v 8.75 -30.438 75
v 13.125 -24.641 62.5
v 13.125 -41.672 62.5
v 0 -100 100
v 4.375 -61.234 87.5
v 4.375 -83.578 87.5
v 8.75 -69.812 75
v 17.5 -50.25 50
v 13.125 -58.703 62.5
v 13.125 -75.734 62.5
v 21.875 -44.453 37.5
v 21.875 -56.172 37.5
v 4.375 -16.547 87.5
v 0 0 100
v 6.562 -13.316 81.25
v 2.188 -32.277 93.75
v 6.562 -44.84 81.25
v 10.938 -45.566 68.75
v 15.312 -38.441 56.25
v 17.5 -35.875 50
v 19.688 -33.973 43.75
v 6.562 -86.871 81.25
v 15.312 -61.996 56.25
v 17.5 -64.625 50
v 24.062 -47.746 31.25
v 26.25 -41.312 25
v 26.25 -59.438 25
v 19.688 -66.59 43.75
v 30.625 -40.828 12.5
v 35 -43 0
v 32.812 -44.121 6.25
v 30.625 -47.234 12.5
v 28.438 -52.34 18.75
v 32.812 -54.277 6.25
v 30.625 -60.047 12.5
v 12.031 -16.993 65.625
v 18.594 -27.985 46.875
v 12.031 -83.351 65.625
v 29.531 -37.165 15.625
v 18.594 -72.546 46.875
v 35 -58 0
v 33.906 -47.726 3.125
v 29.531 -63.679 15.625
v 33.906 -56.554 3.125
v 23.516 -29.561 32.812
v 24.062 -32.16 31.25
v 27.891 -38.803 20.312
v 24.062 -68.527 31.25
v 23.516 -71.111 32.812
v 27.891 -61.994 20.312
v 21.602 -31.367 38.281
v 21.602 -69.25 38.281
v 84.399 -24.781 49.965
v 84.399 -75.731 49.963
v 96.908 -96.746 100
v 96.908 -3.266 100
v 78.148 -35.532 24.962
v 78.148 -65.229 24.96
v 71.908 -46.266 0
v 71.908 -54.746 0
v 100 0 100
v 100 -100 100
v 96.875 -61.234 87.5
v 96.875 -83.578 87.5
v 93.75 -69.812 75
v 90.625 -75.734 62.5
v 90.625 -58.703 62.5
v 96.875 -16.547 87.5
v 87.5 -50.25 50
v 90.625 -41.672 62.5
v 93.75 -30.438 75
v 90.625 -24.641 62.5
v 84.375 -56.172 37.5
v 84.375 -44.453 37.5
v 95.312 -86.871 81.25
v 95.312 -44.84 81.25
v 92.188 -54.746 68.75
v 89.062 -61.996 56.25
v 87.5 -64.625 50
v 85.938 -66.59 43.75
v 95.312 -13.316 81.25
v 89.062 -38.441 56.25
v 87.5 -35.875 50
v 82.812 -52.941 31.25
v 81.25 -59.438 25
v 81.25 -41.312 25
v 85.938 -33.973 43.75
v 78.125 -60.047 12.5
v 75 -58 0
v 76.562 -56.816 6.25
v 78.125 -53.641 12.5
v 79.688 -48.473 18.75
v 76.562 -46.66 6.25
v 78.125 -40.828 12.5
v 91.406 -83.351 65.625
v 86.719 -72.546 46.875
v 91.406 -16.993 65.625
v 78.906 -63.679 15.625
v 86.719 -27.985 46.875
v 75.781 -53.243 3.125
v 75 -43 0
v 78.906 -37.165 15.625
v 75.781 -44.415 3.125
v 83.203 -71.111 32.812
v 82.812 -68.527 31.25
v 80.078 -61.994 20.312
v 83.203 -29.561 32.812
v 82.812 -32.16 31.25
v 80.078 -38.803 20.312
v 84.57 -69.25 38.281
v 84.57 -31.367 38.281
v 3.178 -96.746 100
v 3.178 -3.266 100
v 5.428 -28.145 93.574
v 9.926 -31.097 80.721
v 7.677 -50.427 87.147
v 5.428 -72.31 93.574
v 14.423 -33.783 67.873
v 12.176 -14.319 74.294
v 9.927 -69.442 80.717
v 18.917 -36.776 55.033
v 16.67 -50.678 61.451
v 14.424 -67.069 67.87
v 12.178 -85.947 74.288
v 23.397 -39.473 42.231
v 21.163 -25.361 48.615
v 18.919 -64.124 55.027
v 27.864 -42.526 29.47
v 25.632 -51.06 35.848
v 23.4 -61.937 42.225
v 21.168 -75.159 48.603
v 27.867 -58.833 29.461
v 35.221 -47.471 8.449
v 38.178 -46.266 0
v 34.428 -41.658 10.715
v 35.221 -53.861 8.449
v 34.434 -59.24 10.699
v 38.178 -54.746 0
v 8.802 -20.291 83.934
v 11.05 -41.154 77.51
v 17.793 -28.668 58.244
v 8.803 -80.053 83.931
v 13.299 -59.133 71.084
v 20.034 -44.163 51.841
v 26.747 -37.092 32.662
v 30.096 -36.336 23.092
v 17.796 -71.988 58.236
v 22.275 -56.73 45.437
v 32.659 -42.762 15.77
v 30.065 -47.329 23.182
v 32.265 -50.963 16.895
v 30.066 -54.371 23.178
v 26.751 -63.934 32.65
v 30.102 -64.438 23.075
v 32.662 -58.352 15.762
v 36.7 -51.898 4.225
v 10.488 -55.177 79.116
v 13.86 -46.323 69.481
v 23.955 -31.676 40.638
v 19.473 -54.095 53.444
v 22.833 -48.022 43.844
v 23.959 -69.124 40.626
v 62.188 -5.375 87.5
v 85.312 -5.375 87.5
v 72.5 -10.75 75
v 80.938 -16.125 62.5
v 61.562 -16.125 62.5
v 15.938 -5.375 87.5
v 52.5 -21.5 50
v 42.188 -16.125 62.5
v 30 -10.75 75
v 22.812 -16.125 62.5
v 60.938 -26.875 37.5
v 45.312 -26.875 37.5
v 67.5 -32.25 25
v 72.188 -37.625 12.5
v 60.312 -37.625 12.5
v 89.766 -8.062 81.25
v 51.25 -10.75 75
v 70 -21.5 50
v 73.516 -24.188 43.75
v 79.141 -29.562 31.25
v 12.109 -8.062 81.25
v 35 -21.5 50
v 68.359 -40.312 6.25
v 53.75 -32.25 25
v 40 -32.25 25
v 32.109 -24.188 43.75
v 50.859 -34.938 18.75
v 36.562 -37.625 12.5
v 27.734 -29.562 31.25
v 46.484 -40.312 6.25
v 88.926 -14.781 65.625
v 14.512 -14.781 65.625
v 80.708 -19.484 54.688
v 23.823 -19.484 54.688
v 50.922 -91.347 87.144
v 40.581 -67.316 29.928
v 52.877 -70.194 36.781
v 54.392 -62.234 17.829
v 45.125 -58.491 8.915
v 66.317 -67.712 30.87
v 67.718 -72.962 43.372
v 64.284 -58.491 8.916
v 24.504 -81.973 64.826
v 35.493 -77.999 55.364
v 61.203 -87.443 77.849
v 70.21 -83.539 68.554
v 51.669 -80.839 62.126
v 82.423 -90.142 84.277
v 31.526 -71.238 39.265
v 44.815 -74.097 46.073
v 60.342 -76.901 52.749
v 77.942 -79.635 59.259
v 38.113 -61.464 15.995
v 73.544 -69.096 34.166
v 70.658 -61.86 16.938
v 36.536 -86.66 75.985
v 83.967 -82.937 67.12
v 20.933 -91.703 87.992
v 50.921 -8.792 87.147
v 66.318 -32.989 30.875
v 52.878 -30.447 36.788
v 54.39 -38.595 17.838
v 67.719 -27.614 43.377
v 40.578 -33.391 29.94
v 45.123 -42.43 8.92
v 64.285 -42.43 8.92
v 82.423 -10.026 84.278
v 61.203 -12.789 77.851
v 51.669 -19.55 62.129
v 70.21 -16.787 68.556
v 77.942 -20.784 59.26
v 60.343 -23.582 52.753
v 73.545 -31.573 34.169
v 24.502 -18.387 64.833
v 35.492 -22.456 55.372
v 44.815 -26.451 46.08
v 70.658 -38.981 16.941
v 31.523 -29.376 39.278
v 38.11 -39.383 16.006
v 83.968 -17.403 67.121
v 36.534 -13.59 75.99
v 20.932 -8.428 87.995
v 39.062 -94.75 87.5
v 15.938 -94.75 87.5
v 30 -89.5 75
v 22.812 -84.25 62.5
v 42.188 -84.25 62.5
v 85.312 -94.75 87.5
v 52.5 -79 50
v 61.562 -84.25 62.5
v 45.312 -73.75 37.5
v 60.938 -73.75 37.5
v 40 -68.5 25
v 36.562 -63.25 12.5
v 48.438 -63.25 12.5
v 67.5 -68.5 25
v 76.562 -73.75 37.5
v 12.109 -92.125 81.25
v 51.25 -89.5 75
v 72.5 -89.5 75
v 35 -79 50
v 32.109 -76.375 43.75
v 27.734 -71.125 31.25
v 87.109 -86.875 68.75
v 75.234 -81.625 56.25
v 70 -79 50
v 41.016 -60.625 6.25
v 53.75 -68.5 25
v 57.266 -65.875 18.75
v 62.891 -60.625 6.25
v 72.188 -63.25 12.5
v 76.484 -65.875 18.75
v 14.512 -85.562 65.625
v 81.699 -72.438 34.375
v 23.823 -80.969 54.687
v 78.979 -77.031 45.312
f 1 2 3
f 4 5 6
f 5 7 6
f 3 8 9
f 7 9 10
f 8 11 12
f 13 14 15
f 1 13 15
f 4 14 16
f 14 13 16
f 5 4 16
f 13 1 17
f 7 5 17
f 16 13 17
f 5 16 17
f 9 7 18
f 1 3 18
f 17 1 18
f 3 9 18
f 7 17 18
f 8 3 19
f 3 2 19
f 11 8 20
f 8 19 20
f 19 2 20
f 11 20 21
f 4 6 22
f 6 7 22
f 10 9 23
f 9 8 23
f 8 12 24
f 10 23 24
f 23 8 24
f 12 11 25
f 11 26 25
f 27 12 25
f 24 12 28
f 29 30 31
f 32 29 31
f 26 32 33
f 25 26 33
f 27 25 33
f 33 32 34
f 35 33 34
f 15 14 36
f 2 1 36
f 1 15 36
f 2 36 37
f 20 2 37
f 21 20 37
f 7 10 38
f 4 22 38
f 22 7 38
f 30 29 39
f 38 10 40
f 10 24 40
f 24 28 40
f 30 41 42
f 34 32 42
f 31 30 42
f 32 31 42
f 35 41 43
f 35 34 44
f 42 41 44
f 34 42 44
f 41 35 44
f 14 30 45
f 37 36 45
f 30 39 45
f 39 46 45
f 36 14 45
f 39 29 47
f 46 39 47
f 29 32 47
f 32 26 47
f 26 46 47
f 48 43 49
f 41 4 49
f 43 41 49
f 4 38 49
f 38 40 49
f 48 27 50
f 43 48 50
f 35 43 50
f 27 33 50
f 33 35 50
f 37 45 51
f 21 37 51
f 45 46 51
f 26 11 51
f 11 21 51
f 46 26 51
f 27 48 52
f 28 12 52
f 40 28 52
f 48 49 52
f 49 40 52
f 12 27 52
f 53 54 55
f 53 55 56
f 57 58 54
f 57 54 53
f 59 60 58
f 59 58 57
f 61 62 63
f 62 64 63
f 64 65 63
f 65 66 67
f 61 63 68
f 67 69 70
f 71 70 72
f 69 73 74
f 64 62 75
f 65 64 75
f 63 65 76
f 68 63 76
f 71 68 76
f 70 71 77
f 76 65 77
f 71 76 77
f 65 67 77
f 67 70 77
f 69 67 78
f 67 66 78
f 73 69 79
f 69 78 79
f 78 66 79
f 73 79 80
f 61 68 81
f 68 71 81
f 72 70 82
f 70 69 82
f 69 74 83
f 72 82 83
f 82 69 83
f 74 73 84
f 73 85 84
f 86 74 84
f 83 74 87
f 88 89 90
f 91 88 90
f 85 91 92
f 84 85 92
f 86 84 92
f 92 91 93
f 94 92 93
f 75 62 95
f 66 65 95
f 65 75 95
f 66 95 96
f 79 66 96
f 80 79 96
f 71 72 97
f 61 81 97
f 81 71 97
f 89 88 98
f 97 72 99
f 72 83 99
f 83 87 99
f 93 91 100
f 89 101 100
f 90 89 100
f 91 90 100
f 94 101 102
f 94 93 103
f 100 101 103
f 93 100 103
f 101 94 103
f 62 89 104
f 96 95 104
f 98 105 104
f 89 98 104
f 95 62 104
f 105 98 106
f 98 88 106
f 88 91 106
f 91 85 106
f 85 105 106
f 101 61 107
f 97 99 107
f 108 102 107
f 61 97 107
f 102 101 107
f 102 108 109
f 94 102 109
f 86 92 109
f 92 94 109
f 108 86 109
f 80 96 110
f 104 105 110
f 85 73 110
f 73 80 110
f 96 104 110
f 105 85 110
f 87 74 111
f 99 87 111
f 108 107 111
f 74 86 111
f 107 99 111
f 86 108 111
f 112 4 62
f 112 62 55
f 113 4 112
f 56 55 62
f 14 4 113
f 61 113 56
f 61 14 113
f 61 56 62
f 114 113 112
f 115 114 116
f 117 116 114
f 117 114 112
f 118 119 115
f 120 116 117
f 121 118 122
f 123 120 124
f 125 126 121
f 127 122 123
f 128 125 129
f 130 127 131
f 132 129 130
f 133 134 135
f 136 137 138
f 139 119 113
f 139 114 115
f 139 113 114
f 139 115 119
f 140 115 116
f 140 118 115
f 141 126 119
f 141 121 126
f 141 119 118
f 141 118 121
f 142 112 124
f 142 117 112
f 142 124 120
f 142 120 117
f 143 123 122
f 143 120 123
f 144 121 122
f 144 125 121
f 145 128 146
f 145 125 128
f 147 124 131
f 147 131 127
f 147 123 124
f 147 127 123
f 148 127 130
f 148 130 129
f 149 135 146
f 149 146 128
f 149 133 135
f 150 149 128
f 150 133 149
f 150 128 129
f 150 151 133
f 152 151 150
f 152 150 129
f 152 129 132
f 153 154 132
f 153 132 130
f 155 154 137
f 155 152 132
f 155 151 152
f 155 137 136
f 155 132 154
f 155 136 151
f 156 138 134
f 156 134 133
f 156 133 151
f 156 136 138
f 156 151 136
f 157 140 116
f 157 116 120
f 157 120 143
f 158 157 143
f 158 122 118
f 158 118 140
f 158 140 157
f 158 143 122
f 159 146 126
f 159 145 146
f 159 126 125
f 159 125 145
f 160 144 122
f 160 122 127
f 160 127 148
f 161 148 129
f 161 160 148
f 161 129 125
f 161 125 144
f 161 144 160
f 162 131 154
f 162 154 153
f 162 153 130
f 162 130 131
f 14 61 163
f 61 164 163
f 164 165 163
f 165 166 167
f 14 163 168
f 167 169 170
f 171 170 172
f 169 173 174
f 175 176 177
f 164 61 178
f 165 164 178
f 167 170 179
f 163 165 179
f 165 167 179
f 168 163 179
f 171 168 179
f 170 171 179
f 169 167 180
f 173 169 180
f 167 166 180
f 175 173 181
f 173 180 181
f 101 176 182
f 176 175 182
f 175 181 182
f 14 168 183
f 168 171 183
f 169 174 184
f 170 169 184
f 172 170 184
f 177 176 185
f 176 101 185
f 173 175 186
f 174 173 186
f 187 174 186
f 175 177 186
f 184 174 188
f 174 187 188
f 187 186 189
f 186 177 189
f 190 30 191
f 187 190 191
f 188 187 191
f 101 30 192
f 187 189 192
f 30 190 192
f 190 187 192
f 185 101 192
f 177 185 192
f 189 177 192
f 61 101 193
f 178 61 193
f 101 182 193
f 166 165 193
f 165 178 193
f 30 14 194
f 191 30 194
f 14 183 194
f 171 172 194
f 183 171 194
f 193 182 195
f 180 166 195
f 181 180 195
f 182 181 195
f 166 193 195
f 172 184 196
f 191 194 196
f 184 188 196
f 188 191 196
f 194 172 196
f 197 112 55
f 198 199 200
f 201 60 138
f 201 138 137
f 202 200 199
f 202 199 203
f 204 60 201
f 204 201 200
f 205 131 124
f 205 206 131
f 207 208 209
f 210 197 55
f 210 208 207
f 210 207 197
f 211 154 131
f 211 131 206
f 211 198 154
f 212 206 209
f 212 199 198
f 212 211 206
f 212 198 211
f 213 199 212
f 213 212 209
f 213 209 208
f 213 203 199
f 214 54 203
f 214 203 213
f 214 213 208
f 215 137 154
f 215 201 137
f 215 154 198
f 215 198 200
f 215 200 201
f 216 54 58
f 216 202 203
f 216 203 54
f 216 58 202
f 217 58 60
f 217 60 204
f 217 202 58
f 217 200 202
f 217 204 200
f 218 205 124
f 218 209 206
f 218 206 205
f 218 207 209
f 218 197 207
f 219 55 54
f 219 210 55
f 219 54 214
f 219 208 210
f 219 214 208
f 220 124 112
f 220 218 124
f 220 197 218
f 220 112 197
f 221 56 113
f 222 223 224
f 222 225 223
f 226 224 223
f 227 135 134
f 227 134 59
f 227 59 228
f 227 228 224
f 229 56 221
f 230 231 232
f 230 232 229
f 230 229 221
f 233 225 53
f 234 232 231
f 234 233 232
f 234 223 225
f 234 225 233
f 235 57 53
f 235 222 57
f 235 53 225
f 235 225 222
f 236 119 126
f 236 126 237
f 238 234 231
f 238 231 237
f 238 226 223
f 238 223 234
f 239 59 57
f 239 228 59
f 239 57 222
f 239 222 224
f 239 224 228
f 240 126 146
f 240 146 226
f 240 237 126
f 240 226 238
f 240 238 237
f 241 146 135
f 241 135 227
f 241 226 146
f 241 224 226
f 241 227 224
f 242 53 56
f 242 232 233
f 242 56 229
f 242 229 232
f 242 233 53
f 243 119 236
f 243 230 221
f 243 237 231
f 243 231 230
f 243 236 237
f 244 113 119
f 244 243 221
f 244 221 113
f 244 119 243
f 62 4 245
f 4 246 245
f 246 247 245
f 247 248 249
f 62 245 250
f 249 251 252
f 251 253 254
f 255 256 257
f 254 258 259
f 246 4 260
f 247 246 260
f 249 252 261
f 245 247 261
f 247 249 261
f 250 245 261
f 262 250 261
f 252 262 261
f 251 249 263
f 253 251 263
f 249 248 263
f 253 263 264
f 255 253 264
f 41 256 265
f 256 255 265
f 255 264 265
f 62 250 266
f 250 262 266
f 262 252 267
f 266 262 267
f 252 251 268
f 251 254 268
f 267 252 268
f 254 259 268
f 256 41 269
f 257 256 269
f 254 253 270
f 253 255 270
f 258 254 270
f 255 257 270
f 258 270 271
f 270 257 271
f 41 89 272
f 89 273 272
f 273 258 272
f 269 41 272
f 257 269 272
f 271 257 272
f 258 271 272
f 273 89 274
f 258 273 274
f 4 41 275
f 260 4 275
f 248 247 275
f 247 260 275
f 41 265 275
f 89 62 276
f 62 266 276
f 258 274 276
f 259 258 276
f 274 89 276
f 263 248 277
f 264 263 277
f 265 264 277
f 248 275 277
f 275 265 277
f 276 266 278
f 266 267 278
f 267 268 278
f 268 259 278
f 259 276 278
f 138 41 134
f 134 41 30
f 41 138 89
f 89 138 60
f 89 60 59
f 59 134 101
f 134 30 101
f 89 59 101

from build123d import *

# Parameters (mm, degrees)
F1_W = 100
F1_H = 100
F2_W = 40
F2_H = 15
F4_T = -3


with BuildPart() as f3:
    # F1 (on offset) → F3 section 0
    with BuildSketch(Plane.XY.offset(100)):
        with Locations((50, -50)):
            Rectangle(F1_W, F1_H)
    # F2 (on Top) → F3 section 1
    with BuildSketch(Plane.XY):
        with Locations((55, -50.5)):
            Rectangle(F2_W, F2_H)
    loft()

    # F4
    f4_openings = [f3.faces().sort_by_distance(p)[0] for p in [
        (50, -50, 100),
        (55, -50.5, 0),
    ]]
    offset(amount=F4_T, openings=f4_openings, kind=Kind.INTERSECTION)


solid = f3.part
